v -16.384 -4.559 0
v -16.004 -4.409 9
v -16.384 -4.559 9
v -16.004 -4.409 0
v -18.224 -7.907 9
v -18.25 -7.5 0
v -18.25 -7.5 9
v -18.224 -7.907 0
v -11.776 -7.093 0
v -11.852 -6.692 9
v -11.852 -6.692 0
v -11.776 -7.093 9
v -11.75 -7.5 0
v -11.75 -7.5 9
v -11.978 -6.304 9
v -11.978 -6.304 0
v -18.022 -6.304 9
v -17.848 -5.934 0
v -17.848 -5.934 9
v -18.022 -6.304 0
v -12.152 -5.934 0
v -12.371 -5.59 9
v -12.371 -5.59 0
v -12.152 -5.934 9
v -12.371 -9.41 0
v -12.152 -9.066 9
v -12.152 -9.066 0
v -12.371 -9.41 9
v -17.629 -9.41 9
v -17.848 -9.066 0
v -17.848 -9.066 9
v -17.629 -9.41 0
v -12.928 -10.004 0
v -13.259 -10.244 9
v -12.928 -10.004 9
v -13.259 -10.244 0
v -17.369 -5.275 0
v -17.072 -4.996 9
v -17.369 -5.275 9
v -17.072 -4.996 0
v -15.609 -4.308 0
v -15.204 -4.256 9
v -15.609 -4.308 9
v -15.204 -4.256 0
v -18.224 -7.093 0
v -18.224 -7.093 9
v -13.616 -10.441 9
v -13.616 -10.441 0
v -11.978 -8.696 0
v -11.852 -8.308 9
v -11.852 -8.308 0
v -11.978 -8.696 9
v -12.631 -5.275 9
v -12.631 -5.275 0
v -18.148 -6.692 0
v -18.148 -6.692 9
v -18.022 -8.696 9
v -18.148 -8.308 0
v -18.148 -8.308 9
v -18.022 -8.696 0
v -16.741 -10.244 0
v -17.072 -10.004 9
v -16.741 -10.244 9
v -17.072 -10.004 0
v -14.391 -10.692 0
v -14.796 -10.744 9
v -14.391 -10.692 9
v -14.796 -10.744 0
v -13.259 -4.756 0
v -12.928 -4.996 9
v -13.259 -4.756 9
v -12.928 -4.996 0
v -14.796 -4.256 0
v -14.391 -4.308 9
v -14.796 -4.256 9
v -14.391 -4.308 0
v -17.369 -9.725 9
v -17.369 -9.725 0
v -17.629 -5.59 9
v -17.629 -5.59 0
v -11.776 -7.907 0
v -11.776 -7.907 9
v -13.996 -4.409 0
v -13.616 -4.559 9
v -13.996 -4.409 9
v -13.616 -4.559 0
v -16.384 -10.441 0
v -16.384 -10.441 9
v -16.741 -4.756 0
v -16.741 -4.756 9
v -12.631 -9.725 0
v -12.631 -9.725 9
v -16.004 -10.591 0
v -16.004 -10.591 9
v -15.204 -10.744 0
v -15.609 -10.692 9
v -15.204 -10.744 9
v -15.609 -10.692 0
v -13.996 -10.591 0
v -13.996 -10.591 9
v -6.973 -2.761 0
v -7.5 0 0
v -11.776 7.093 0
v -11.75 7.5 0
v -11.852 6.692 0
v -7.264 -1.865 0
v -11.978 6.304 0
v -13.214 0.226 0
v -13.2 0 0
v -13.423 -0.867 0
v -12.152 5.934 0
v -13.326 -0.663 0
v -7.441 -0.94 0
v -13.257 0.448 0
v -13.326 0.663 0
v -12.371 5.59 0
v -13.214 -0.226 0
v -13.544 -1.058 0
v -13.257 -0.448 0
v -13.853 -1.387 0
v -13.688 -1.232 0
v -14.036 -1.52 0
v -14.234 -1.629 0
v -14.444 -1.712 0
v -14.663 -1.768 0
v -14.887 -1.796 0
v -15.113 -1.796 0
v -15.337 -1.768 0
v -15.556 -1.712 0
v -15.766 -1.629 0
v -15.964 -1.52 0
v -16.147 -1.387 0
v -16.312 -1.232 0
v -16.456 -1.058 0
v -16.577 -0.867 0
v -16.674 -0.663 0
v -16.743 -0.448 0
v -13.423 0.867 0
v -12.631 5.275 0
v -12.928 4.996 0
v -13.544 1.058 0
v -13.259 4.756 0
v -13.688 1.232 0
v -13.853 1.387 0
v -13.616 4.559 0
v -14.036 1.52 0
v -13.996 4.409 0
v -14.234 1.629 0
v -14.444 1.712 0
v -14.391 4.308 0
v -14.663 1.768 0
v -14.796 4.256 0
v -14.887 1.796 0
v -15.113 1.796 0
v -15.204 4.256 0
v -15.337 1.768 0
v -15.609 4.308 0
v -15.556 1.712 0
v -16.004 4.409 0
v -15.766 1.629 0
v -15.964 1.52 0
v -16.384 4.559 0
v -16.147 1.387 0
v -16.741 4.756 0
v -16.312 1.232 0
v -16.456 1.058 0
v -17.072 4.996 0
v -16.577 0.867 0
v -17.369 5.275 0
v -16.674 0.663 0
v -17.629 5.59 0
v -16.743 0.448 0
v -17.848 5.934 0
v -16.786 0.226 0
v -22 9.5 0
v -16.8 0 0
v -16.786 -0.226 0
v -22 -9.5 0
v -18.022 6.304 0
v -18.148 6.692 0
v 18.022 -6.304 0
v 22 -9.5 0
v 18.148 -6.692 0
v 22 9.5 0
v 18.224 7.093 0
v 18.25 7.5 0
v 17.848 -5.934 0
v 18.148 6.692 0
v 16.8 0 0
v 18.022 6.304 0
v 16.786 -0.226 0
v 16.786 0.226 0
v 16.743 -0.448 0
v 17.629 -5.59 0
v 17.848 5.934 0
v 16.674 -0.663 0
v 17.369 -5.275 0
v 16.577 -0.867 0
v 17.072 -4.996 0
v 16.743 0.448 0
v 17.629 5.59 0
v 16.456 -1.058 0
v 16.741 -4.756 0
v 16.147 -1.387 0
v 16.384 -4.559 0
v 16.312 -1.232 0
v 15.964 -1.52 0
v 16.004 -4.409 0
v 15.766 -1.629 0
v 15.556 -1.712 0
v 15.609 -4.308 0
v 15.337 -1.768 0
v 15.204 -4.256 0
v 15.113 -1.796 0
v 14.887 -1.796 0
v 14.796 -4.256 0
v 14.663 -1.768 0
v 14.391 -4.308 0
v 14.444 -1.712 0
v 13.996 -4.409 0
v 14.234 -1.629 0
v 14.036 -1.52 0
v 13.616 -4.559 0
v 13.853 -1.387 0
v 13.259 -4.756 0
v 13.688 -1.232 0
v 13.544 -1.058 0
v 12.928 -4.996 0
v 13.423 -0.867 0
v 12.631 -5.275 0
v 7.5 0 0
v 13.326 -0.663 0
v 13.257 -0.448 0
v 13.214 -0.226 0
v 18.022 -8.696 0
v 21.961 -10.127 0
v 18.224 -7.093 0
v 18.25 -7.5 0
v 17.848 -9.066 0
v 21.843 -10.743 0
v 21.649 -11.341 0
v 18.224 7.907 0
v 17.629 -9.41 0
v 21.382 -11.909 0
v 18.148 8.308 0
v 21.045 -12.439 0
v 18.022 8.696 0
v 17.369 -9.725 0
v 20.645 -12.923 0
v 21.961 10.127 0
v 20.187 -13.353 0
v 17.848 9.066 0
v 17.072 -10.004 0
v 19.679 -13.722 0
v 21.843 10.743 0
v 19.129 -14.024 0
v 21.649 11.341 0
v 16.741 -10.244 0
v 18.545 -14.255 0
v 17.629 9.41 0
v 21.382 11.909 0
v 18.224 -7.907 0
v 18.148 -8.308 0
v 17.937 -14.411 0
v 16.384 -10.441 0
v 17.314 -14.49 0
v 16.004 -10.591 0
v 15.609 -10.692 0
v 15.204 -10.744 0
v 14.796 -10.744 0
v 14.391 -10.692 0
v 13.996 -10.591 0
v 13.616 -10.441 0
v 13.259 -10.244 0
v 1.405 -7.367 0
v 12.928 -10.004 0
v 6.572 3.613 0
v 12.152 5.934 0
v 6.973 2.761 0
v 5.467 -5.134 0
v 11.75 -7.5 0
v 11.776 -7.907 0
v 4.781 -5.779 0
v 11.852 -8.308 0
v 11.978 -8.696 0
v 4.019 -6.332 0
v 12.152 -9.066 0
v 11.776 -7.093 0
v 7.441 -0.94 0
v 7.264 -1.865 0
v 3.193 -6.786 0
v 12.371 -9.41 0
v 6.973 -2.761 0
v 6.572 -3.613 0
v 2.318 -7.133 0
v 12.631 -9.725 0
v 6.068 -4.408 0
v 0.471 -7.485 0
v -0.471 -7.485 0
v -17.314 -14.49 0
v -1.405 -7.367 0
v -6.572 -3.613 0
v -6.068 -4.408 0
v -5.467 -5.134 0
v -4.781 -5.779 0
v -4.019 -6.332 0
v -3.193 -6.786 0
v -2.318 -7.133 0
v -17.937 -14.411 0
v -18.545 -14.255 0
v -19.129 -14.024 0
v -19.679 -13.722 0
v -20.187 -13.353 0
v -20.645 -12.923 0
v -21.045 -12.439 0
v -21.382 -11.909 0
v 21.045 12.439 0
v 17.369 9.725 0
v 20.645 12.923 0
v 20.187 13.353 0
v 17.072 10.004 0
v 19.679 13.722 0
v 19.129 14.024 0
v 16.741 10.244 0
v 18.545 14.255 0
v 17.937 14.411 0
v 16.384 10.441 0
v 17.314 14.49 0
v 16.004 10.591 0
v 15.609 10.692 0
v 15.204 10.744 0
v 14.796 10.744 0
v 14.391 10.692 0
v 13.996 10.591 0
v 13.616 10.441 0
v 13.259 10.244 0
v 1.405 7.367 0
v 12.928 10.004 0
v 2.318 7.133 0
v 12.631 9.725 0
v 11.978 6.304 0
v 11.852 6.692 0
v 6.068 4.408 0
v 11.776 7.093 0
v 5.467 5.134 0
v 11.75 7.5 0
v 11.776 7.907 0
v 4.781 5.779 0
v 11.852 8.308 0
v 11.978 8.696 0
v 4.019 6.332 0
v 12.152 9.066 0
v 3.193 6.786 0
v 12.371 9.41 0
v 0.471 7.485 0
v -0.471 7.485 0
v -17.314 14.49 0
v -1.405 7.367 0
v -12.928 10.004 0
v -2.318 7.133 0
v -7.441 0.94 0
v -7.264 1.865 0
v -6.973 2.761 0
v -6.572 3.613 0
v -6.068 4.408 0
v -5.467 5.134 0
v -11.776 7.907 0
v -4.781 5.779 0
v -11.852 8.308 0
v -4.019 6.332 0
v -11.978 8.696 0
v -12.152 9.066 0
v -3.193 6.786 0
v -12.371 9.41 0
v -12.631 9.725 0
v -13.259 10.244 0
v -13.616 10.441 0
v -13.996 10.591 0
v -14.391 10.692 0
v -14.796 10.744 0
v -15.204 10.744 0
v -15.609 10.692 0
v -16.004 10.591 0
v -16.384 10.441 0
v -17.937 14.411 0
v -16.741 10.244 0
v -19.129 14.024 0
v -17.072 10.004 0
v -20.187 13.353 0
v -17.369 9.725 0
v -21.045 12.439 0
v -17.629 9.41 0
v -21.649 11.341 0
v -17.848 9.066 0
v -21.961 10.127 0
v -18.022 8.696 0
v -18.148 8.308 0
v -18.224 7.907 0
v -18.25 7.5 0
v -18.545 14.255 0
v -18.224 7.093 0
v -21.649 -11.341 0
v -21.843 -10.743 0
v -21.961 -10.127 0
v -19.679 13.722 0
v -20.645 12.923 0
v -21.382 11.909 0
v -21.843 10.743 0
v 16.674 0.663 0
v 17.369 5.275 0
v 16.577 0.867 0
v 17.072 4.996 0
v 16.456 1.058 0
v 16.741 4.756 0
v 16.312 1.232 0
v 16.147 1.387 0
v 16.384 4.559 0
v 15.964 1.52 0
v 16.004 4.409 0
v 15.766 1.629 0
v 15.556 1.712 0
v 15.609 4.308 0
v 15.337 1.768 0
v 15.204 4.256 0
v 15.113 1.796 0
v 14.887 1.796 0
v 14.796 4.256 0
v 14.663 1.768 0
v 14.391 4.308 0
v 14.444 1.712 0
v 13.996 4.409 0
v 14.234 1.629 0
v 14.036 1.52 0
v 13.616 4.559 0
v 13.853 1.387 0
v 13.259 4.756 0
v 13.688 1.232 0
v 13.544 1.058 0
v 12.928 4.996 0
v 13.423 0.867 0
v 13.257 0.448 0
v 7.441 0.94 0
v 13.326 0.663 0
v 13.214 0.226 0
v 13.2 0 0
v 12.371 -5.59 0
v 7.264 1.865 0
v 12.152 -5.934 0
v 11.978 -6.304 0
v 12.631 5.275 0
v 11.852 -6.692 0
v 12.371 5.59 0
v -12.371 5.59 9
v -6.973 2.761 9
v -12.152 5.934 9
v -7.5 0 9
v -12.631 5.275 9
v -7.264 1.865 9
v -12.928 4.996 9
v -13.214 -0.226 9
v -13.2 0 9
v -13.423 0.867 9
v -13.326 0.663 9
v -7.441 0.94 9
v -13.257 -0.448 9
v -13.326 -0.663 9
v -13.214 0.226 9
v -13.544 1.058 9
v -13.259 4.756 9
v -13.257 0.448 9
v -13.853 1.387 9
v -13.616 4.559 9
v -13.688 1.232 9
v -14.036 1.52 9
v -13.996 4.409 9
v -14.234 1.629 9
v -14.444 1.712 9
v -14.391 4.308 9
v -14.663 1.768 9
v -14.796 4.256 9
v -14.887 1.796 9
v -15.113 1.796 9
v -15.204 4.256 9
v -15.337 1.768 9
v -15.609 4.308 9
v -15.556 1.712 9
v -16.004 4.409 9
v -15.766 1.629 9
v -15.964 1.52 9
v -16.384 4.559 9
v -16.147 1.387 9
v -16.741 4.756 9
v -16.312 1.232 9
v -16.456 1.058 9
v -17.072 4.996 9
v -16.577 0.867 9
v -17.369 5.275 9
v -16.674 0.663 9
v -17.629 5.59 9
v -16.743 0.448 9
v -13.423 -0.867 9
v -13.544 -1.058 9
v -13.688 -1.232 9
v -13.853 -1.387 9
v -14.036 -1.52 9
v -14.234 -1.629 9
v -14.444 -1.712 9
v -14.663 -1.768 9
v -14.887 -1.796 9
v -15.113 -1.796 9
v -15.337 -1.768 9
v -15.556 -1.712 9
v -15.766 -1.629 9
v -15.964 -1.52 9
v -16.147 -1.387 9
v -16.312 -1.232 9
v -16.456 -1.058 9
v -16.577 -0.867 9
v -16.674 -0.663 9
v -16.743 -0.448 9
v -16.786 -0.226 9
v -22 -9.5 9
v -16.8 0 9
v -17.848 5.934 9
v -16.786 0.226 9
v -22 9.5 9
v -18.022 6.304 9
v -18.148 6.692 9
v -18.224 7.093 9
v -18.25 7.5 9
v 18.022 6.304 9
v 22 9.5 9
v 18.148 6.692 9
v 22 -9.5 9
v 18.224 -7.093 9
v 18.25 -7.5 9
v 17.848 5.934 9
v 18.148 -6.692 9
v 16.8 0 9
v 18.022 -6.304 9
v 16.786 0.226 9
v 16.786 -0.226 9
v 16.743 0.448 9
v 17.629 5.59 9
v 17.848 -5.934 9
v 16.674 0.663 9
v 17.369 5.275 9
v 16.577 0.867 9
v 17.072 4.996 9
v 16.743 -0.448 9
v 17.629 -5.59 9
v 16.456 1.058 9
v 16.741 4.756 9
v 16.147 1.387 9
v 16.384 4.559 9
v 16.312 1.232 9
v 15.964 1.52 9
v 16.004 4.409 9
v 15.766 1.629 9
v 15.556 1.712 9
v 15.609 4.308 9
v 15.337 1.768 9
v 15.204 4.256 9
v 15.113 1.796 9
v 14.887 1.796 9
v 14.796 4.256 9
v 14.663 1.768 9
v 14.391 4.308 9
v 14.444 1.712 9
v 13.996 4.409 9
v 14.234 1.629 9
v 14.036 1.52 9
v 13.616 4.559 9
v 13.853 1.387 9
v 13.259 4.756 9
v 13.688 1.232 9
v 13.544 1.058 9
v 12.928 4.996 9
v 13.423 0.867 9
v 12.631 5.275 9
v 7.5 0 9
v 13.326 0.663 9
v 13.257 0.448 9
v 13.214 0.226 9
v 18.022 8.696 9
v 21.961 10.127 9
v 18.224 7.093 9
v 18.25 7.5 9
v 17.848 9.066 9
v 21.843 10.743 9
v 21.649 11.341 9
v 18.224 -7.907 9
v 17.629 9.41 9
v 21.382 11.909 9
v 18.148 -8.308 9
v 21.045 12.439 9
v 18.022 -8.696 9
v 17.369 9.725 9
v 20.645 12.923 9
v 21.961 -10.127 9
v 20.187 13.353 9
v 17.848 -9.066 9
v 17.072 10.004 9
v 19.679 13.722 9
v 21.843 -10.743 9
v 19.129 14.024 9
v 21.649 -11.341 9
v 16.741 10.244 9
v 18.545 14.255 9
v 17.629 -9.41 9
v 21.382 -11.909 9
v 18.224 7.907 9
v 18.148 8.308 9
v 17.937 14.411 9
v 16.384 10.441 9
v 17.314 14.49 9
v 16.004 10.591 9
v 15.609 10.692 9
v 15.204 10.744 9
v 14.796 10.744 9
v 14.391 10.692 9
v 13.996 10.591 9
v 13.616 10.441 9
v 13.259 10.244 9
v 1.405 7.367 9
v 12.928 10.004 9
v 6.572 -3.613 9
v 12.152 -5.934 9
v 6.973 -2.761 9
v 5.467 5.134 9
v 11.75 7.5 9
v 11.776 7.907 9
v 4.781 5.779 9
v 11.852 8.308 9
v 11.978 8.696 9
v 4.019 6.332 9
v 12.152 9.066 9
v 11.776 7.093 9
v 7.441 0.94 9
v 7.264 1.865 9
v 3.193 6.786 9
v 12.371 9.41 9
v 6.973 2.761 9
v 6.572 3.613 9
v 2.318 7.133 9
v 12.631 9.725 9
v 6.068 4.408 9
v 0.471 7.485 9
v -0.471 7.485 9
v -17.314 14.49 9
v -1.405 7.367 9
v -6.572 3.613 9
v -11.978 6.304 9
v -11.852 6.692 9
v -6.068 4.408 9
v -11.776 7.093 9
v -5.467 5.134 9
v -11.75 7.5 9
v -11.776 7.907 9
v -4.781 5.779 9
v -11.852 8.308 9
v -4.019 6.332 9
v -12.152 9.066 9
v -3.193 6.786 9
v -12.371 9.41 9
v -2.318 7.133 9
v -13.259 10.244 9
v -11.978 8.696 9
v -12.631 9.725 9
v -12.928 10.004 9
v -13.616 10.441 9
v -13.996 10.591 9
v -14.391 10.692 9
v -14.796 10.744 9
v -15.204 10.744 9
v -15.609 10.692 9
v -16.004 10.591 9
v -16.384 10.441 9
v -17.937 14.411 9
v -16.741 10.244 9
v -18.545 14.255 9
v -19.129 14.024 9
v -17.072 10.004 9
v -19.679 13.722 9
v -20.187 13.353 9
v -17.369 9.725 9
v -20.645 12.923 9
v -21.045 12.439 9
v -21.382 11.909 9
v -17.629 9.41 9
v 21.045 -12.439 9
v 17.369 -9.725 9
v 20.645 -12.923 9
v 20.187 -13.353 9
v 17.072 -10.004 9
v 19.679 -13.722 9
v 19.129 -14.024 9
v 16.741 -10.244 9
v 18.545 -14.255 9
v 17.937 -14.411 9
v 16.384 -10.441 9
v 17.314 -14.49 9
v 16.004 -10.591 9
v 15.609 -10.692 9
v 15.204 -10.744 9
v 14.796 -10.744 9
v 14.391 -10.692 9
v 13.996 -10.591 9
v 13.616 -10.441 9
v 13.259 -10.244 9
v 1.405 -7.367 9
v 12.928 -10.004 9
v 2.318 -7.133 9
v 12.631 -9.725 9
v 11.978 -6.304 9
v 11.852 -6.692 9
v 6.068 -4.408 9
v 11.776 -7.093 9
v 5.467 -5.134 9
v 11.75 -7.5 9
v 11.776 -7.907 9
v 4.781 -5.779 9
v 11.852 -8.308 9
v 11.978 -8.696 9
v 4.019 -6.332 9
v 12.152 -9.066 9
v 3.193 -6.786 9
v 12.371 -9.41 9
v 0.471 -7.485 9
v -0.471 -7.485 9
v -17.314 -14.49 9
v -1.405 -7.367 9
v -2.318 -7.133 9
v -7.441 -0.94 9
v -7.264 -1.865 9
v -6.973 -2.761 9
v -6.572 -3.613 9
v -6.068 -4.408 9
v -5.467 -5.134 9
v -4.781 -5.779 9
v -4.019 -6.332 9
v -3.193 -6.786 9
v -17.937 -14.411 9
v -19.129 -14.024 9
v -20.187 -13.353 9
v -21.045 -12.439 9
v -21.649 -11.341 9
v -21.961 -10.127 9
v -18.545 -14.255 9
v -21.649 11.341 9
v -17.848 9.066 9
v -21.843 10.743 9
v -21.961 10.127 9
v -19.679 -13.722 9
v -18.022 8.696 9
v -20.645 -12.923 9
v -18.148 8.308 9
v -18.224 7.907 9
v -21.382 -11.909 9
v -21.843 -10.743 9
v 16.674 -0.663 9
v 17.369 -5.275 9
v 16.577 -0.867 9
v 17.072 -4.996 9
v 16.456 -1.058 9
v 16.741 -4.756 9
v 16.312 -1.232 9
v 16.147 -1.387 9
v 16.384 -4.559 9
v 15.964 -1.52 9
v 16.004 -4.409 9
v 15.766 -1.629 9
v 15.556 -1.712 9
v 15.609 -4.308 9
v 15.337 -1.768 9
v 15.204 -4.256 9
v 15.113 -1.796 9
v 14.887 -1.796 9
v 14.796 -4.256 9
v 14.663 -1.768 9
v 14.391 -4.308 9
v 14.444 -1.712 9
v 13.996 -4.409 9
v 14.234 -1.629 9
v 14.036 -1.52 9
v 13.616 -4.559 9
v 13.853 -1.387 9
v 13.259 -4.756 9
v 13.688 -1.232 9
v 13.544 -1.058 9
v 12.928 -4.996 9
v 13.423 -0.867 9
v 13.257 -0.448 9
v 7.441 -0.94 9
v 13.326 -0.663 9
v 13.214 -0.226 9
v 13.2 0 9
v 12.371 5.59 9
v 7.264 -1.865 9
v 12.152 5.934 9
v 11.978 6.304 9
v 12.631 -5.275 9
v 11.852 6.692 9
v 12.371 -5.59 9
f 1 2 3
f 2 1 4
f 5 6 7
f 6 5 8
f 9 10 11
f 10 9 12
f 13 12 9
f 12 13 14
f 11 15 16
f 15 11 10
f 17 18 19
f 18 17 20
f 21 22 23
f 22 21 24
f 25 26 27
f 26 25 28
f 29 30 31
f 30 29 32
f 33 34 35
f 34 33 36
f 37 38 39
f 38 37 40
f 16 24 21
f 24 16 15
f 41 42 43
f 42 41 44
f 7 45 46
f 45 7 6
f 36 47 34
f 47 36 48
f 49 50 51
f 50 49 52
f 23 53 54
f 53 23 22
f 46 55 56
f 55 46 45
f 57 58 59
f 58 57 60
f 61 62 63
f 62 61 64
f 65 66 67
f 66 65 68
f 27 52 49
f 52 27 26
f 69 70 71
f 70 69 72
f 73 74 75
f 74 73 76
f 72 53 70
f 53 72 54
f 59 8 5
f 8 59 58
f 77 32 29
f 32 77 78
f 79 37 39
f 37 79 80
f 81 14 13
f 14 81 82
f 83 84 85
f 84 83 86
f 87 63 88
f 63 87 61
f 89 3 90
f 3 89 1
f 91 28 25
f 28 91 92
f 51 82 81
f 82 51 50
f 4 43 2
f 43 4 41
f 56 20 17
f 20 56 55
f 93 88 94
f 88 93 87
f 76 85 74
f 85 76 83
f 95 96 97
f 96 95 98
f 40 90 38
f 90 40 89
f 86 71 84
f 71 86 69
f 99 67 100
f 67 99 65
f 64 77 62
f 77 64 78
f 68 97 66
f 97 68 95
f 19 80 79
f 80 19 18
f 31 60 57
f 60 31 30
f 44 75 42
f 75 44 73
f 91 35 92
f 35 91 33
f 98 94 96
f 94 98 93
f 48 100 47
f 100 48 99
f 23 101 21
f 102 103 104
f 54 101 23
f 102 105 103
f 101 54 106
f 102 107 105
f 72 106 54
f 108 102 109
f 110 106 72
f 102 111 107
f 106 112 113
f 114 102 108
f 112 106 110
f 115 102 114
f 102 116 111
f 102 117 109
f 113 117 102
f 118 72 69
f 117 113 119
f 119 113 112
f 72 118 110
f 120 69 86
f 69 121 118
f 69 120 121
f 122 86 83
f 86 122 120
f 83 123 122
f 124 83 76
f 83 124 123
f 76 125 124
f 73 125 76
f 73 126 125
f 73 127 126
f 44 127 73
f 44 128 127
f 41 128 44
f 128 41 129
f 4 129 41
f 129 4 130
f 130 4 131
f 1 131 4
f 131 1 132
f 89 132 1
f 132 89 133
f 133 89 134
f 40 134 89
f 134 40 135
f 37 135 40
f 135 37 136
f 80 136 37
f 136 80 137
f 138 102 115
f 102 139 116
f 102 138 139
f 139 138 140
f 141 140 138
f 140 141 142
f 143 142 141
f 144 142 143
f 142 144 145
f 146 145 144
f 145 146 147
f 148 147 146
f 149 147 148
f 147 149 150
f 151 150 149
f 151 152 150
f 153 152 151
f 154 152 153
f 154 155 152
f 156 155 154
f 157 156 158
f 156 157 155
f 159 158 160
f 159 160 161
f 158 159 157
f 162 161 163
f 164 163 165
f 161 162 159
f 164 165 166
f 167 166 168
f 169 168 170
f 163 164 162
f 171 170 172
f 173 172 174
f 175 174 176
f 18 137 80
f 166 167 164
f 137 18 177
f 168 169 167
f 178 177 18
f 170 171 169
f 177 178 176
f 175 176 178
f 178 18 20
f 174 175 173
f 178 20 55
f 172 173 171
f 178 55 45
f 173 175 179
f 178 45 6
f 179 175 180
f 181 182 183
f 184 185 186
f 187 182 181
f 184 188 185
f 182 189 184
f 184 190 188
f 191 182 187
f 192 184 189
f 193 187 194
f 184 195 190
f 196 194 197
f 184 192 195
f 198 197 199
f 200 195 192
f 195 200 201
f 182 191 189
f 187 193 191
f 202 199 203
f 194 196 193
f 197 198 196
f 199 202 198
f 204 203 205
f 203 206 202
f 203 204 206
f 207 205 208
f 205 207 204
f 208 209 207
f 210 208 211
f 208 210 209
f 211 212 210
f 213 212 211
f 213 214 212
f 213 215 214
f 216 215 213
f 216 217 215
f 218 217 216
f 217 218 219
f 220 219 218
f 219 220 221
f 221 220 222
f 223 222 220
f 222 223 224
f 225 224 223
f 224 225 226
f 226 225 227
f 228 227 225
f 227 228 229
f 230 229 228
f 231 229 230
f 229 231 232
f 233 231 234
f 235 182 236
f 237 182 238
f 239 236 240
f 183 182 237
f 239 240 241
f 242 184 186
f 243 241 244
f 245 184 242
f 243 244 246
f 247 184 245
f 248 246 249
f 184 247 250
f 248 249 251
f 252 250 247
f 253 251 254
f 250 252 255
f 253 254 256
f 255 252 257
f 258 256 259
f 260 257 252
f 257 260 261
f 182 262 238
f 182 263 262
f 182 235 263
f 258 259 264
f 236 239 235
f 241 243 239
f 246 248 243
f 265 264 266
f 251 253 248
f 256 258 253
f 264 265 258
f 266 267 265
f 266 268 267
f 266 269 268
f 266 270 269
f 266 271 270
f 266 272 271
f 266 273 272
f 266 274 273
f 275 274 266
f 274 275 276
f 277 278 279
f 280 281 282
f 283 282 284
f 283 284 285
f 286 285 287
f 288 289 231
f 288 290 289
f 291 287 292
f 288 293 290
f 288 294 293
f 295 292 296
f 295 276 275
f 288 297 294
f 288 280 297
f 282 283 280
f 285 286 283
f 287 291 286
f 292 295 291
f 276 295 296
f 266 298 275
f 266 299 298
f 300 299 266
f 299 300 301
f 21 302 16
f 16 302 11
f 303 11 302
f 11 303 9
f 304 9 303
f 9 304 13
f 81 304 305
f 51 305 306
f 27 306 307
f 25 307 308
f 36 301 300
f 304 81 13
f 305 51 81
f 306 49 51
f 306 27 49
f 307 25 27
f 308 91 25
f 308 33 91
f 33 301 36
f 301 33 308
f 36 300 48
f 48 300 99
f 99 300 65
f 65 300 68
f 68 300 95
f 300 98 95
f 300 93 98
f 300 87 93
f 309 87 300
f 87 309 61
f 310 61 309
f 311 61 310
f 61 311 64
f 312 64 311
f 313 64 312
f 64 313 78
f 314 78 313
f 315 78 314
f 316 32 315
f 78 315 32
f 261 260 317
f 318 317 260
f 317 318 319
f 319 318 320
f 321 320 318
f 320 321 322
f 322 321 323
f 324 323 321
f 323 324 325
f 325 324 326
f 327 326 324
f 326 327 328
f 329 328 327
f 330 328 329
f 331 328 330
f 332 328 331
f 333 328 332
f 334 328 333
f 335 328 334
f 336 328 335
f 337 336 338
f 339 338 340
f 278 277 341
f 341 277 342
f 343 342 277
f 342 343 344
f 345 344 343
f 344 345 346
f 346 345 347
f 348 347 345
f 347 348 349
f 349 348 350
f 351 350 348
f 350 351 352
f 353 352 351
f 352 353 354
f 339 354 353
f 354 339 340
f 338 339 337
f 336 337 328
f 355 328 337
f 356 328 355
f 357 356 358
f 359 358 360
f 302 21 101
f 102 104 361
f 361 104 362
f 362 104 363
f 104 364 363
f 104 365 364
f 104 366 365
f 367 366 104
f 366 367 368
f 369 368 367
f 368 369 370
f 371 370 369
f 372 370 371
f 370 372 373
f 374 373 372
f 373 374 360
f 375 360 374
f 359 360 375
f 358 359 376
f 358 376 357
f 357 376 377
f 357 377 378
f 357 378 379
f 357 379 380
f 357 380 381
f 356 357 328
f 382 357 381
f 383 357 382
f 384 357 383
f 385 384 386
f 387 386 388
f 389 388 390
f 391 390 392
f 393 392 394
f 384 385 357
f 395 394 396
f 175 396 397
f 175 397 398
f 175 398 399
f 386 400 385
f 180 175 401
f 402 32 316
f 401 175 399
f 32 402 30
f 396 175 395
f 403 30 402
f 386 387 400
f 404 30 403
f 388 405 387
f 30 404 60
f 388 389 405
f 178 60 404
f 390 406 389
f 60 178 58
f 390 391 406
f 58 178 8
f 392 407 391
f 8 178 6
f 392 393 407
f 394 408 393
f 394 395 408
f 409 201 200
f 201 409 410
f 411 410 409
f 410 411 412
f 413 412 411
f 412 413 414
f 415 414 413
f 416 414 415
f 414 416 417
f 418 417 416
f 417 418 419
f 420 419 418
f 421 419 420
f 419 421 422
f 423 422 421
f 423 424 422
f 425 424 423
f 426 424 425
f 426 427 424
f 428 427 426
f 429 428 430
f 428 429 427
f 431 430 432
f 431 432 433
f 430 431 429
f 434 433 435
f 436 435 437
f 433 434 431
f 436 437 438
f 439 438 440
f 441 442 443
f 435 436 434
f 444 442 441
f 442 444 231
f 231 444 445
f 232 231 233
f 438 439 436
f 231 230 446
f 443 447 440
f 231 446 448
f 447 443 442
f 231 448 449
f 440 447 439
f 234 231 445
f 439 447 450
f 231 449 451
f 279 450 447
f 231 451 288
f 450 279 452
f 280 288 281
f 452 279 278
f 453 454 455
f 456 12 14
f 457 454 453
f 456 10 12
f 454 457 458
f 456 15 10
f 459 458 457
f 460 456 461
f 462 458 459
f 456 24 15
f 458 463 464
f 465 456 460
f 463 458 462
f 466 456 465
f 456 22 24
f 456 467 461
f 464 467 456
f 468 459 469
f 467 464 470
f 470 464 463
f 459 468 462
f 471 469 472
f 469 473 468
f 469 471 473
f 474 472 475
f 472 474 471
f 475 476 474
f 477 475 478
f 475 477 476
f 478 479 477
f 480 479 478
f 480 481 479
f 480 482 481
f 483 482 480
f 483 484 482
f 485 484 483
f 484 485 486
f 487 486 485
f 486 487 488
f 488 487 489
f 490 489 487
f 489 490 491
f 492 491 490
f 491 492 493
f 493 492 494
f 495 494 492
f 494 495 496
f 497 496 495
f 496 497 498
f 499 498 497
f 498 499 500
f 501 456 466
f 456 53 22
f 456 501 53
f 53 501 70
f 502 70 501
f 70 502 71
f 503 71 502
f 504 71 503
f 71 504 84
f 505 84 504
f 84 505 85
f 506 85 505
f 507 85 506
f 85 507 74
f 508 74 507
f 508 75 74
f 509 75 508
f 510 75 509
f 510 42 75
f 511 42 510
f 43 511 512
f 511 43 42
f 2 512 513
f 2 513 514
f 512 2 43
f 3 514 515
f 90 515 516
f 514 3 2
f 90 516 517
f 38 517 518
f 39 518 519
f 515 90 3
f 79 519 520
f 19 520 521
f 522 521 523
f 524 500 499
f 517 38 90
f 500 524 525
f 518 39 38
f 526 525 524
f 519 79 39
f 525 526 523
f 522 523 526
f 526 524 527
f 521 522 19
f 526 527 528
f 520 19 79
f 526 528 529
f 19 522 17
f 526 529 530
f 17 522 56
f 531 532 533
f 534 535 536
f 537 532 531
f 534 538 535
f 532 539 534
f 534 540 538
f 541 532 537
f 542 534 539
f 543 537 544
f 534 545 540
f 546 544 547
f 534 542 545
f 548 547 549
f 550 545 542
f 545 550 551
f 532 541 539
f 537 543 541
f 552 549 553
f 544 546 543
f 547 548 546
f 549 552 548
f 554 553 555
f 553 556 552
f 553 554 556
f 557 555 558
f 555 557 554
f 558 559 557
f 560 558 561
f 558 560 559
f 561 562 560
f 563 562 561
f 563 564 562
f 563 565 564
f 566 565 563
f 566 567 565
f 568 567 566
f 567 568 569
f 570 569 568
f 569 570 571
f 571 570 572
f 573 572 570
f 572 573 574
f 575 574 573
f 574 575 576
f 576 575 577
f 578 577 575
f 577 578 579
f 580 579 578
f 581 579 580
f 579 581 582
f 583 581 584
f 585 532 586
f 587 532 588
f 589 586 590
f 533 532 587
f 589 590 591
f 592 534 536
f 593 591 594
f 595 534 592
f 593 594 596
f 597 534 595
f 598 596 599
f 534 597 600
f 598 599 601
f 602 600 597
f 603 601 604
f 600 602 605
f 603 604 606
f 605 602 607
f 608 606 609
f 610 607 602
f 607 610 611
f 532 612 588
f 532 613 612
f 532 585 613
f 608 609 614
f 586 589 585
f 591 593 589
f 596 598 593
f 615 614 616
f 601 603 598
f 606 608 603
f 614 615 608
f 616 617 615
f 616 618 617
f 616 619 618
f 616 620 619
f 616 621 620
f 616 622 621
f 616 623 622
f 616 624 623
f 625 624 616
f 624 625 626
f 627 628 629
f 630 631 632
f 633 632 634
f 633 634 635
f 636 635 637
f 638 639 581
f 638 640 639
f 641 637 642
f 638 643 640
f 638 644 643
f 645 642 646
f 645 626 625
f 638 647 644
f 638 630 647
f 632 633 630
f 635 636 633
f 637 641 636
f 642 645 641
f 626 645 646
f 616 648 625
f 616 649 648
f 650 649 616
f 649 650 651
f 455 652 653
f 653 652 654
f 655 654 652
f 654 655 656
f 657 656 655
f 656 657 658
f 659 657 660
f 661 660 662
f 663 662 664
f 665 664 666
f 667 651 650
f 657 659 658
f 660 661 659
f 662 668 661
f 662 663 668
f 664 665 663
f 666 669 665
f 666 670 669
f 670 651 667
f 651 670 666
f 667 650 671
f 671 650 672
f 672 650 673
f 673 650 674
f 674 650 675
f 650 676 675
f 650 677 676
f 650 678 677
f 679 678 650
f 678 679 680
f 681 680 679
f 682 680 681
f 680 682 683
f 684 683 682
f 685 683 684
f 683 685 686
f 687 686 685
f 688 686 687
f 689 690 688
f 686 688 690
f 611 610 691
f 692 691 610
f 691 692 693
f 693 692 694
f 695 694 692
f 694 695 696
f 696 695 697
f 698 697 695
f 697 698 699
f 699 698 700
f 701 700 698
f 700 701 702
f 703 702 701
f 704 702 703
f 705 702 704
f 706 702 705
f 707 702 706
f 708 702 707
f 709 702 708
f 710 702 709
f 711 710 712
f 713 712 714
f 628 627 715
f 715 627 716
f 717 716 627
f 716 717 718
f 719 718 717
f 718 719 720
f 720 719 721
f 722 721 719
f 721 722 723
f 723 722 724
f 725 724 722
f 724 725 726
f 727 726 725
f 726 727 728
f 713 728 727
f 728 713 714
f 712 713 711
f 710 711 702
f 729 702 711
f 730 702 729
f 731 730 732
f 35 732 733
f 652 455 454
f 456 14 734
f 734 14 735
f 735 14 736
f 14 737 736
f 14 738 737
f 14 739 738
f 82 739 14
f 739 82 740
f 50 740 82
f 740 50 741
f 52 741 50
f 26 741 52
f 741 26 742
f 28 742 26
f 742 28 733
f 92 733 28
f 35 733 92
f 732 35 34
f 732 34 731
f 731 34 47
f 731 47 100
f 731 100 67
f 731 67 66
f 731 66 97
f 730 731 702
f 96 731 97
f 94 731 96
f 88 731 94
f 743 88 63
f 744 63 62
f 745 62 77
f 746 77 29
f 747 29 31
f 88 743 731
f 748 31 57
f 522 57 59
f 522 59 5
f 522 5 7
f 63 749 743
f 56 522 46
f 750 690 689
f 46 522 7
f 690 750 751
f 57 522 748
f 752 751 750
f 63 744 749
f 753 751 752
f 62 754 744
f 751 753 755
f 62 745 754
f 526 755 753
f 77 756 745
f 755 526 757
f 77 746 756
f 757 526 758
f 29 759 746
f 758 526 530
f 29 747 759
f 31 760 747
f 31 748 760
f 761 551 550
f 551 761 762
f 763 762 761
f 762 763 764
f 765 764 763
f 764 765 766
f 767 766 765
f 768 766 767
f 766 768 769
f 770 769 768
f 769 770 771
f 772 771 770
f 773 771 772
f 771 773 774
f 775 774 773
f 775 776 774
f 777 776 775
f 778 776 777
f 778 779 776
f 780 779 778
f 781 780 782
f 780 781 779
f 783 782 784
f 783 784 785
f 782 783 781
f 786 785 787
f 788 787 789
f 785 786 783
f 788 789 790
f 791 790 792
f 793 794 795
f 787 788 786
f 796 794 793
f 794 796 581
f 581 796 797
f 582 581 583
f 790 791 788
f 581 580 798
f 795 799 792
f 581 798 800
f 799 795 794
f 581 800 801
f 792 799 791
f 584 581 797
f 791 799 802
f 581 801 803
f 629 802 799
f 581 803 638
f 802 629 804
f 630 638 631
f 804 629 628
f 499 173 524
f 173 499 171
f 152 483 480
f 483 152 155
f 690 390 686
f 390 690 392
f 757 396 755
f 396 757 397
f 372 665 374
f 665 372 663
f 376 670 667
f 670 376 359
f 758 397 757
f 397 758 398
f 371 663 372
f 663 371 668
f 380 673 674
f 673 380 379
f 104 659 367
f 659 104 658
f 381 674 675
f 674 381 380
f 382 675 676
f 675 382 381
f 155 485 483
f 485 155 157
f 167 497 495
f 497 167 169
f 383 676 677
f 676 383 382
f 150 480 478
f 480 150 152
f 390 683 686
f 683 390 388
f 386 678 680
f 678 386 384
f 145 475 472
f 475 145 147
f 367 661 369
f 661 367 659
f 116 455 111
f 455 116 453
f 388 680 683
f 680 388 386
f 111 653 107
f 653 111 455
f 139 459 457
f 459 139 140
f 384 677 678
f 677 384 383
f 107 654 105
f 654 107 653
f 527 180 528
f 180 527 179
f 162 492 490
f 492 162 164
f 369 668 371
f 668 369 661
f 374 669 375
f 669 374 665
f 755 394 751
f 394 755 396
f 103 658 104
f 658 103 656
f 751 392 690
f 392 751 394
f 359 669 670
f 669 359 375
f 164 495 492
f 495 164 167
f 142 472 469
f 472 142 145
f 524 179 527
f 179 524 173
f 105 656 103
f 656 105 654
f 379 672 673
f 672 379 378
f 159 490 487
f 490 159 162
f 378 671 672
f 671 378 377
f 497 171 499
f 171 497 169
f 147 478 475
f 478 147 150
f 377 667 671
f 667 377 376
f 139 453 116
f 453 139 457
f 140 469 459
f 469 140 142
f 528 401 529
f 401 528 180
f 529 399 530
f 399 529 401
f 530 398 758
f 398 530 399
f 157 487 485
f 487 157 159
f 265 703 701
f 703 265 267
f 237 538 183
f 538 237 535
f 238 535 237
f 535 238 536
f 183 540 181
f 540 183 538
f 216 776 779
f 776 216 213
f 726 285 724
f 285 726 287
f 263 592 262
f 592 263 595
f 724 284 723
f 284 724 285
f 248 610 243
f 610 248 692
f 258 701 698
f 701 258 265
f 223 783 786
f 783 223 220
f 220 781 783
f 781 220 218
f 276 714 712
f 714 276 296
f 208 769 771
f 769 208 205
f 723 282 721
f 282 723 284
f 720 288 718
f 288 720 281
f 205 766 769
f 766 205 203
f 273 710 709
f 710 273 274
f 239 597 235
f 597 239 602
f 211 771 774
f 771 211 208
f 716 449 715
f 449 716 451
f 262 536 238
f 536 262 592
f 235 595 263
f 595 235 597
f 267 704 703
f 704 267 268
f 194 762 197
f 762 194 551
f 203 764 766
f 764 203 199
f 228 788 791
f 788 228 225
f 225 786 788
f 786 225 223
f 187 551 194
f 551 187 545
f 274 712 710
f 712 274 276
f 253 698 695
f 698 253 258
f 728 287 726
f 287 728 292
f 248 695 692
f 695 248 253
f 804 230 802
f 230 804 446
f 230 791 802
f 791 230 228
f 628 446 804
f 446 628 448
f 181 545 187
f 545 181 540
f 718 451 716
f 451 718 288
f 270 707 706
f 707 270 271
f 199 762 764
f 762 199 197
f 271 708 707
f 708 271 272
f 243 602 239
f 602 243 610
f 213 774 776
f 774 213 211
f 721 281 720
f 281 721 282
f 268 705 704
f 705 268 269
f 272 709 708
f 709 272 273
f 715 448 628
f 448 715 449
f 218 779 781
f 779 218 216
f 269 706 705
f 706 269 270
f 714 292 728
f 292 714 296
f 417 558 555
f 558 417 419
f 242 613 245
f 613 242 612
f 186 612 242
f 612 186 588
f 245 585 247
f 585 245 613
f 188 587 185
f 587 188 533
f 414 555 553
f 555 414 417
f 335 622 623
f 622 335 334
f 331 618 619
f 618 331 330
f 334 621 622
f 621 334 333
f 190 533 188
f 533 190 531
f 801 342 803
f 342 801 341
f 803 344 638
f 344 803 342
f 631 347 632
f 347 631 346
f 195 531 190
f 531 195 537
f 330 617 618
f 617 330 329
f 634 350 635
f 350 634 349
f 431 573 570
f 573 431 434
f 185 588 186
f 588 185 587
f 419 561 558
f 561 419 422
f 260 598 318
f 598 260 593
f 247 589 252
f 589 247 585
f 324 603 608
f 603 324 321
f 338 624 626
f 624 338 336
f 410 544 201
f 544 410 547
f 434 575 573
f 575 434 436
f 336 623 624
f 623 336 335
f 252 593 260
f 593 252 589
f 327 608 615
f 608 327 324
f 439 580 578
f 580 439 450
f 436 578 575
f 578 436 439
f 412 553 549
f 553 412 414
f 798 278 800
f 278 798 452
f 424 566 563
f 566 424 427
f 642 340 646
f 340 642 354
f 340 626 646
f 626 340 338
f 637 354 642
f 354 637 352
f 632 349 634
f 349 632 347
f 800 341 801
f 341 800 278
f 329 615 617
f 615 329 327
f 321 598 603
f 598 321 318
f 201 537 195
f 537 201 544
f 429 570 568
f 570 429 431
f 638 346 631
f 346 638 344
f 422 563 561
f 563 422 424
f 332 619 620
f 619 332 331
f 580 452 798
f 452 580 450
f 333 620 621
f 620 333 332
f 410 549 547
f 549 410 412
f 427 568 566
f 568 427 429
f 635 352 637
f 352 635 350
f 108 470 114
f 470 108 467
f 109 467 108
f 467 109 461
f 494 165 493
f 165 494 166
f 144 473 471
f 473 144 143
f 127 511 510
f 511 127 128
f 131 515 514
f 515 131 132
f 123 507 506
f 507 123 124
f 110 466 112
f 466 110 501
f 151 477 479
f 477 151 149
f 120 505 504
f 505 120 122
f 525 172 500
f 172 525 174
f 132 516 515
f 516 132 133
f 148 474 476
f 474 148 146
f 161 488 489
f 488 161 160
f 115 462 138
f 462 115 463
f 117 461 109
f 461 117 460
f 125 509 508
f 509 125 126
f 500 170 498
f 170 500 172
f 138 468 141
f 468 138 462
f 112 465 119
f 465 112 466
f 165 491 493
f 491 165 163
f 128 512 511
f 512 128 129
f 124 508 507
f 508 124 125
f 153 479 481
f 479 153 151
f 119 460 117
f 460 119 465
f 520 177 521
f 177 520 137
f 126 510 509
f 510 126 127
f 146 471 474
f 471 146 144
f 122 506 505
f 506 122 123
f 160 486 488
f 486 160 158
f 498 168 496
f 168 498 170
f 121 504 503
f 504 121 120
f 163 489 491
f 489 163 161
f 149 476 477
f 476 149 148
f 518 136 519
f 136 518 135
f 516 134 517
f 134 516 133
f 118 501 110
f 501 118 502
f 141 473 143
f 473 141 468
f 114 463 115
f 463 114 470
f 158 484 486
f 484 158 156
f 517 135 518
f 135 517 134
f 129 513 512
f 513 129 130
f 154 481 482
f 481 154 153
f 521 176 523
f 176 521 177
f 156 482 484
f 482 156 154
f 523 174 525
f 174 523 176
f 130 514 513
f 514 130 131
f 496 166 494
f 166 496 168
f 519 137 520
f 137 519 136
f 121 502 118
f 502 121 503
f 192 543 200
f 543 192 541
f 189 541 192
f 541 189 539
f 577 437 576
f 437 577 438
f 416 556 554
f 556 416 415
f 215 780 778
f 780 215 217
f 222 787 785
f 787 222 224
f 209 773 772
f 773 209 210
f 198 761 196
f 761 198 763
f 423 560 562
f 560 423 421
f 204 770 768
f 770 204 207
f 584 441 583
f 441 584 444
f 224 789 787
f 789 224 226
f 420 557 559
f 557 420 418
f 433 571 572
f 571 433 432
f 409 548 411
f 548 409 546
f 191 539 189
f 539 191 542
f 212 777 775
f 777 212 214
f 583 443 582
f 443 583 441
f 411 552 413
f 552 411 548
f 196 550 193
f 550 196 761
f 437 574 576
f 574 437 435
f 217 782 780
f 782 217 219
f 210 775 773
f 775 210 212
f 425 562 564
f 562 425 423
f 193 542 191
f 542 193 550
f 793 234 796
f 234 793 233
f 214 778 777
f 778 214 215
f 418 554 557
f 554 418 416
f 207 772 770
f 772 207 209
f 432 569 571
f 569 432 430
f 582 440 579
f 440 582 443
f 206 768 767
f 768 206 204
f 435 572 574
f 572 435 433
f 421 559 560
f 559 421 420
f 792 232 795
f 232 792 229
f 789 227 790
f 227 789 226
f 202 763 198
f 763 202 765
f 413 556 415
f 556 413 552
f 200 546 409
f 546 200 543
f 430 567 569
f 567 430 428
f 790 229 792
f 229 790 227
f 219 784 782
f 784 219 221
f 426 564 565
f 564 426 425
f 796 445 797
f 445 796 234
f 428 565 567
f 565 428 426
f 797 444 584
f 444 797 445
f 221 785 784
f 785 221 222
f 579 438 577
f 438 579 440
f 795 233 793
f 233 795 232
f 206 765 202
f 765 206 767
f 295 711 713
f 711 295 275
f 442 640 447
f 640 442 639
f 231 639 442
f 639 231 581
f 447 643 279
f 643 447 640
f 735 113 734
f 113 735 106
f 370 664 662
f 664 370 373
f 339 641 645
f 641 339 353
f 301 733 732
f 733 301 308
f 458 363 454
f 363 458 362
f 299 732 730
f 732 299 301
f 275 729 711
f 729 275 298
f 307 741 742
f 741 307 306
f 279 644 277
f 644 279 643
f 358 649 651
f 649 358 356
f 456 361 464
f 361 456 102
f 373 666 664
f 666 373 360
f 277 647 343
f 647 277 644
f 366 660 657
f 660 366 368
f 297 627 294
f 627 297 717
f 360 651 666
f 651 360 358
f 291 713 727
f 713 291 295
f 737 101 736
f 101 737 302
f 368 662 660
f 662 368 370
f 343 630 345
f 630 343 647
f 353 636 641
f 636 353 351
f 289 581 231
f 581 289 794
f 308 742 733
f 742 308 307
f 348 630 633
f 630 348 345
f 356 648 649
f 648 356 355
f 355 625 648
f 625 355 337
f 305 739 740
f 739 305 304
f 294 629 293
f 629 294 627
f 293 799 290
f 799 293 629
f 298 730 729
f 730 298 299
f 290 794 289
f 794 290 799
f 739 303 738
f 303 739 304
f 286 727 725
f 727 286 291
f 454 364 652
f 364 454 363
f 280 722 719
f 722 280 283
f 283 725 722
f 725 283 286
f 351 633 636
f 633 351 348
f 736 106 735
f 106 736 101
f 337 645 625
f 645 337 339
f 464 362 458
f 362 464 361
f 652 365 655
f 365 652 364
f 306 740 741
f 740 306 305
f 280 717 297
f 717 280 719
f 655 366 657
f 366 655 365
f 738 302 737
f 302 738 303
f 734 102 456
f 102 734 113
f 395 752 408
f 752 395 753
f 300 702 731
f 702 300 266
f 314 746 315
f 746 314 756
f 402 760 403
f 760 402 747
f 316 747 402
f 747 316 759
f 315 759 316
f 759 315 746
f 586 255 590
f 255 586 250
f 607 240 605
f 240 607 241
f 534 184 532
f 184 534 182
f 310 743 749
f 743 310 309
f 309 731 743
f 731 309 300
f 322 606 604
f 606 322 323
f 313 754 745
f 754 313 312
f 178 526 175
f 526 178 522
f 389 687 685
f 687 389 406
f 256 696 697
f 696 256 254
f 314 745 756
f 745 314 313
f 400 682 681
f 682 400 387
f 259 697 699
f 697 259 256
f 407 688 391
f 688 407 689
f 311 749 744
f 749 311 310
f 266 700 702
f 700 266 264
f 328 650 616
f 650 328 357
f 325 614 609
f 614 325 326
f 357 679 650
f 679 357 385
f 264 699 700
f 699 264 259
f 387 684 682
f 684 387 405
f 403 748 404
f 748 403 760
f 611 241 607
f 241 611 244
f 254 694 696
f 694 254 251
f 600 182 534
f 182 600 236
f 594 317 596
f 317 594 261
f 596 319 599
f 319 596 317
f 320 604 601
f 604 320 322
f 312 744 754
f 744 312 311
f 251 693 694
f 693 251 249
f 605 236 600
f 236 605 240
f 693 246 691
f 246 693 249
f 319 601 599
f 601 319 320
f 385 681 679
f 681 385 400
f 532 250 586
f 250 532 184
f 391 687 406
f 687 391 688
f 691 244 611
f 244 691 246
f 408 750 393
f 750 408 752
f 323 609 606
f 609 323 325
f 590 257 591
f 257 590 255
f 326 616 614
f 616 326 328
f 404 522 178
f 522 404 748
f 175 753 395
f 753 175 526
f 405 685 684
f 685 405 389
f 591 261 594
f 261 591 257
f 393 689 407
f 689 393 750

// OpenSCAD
$fn = 50;

difference() {
	union() {
		hull() {
			translate(v = [-17.0, 9.5, 0]) {
				cylinder(h = 9, r = 5);
			}
			translate(v = [17.0, 9.5, 0]) {
				cylinder(h = 9, r = 5);
			}
			translate(v = [-17.0, -9.5, 0]) {
				cylinder(h = 9, r = 5);
			}
			translate(v = [17.0, -9.5, 0]) {
				cylinder(h = 9, r = 5);
			}
		}
	}
	union() {
		translate(v = [-15.0, -7.5, 0]) {
			cylinder(h = 9, r = 3.25);
		}
		translate(v = [-15.0, 7.5, 0]) {
			cylinder(h = 9, r = 3.25);
		}
		translate(v = [15.0, -7.5, 0]) {
			cylinder(h = 9, r = 3.25);
		}
		translate(v = [15.0, 7.5, 0]) {
			cylinder(h = 9, r = 3.25);
		}
		translate(v = [-15.0, 0.0, 0]) {
			cylinder(h = 9, r = 1.8);
		}
		translate(v = [15.0, 0.0, 0]) {
			cylinder(h = 9, r = 1.8);
		}
		cylinder(h = 9, r = 7.5);
	}
}
